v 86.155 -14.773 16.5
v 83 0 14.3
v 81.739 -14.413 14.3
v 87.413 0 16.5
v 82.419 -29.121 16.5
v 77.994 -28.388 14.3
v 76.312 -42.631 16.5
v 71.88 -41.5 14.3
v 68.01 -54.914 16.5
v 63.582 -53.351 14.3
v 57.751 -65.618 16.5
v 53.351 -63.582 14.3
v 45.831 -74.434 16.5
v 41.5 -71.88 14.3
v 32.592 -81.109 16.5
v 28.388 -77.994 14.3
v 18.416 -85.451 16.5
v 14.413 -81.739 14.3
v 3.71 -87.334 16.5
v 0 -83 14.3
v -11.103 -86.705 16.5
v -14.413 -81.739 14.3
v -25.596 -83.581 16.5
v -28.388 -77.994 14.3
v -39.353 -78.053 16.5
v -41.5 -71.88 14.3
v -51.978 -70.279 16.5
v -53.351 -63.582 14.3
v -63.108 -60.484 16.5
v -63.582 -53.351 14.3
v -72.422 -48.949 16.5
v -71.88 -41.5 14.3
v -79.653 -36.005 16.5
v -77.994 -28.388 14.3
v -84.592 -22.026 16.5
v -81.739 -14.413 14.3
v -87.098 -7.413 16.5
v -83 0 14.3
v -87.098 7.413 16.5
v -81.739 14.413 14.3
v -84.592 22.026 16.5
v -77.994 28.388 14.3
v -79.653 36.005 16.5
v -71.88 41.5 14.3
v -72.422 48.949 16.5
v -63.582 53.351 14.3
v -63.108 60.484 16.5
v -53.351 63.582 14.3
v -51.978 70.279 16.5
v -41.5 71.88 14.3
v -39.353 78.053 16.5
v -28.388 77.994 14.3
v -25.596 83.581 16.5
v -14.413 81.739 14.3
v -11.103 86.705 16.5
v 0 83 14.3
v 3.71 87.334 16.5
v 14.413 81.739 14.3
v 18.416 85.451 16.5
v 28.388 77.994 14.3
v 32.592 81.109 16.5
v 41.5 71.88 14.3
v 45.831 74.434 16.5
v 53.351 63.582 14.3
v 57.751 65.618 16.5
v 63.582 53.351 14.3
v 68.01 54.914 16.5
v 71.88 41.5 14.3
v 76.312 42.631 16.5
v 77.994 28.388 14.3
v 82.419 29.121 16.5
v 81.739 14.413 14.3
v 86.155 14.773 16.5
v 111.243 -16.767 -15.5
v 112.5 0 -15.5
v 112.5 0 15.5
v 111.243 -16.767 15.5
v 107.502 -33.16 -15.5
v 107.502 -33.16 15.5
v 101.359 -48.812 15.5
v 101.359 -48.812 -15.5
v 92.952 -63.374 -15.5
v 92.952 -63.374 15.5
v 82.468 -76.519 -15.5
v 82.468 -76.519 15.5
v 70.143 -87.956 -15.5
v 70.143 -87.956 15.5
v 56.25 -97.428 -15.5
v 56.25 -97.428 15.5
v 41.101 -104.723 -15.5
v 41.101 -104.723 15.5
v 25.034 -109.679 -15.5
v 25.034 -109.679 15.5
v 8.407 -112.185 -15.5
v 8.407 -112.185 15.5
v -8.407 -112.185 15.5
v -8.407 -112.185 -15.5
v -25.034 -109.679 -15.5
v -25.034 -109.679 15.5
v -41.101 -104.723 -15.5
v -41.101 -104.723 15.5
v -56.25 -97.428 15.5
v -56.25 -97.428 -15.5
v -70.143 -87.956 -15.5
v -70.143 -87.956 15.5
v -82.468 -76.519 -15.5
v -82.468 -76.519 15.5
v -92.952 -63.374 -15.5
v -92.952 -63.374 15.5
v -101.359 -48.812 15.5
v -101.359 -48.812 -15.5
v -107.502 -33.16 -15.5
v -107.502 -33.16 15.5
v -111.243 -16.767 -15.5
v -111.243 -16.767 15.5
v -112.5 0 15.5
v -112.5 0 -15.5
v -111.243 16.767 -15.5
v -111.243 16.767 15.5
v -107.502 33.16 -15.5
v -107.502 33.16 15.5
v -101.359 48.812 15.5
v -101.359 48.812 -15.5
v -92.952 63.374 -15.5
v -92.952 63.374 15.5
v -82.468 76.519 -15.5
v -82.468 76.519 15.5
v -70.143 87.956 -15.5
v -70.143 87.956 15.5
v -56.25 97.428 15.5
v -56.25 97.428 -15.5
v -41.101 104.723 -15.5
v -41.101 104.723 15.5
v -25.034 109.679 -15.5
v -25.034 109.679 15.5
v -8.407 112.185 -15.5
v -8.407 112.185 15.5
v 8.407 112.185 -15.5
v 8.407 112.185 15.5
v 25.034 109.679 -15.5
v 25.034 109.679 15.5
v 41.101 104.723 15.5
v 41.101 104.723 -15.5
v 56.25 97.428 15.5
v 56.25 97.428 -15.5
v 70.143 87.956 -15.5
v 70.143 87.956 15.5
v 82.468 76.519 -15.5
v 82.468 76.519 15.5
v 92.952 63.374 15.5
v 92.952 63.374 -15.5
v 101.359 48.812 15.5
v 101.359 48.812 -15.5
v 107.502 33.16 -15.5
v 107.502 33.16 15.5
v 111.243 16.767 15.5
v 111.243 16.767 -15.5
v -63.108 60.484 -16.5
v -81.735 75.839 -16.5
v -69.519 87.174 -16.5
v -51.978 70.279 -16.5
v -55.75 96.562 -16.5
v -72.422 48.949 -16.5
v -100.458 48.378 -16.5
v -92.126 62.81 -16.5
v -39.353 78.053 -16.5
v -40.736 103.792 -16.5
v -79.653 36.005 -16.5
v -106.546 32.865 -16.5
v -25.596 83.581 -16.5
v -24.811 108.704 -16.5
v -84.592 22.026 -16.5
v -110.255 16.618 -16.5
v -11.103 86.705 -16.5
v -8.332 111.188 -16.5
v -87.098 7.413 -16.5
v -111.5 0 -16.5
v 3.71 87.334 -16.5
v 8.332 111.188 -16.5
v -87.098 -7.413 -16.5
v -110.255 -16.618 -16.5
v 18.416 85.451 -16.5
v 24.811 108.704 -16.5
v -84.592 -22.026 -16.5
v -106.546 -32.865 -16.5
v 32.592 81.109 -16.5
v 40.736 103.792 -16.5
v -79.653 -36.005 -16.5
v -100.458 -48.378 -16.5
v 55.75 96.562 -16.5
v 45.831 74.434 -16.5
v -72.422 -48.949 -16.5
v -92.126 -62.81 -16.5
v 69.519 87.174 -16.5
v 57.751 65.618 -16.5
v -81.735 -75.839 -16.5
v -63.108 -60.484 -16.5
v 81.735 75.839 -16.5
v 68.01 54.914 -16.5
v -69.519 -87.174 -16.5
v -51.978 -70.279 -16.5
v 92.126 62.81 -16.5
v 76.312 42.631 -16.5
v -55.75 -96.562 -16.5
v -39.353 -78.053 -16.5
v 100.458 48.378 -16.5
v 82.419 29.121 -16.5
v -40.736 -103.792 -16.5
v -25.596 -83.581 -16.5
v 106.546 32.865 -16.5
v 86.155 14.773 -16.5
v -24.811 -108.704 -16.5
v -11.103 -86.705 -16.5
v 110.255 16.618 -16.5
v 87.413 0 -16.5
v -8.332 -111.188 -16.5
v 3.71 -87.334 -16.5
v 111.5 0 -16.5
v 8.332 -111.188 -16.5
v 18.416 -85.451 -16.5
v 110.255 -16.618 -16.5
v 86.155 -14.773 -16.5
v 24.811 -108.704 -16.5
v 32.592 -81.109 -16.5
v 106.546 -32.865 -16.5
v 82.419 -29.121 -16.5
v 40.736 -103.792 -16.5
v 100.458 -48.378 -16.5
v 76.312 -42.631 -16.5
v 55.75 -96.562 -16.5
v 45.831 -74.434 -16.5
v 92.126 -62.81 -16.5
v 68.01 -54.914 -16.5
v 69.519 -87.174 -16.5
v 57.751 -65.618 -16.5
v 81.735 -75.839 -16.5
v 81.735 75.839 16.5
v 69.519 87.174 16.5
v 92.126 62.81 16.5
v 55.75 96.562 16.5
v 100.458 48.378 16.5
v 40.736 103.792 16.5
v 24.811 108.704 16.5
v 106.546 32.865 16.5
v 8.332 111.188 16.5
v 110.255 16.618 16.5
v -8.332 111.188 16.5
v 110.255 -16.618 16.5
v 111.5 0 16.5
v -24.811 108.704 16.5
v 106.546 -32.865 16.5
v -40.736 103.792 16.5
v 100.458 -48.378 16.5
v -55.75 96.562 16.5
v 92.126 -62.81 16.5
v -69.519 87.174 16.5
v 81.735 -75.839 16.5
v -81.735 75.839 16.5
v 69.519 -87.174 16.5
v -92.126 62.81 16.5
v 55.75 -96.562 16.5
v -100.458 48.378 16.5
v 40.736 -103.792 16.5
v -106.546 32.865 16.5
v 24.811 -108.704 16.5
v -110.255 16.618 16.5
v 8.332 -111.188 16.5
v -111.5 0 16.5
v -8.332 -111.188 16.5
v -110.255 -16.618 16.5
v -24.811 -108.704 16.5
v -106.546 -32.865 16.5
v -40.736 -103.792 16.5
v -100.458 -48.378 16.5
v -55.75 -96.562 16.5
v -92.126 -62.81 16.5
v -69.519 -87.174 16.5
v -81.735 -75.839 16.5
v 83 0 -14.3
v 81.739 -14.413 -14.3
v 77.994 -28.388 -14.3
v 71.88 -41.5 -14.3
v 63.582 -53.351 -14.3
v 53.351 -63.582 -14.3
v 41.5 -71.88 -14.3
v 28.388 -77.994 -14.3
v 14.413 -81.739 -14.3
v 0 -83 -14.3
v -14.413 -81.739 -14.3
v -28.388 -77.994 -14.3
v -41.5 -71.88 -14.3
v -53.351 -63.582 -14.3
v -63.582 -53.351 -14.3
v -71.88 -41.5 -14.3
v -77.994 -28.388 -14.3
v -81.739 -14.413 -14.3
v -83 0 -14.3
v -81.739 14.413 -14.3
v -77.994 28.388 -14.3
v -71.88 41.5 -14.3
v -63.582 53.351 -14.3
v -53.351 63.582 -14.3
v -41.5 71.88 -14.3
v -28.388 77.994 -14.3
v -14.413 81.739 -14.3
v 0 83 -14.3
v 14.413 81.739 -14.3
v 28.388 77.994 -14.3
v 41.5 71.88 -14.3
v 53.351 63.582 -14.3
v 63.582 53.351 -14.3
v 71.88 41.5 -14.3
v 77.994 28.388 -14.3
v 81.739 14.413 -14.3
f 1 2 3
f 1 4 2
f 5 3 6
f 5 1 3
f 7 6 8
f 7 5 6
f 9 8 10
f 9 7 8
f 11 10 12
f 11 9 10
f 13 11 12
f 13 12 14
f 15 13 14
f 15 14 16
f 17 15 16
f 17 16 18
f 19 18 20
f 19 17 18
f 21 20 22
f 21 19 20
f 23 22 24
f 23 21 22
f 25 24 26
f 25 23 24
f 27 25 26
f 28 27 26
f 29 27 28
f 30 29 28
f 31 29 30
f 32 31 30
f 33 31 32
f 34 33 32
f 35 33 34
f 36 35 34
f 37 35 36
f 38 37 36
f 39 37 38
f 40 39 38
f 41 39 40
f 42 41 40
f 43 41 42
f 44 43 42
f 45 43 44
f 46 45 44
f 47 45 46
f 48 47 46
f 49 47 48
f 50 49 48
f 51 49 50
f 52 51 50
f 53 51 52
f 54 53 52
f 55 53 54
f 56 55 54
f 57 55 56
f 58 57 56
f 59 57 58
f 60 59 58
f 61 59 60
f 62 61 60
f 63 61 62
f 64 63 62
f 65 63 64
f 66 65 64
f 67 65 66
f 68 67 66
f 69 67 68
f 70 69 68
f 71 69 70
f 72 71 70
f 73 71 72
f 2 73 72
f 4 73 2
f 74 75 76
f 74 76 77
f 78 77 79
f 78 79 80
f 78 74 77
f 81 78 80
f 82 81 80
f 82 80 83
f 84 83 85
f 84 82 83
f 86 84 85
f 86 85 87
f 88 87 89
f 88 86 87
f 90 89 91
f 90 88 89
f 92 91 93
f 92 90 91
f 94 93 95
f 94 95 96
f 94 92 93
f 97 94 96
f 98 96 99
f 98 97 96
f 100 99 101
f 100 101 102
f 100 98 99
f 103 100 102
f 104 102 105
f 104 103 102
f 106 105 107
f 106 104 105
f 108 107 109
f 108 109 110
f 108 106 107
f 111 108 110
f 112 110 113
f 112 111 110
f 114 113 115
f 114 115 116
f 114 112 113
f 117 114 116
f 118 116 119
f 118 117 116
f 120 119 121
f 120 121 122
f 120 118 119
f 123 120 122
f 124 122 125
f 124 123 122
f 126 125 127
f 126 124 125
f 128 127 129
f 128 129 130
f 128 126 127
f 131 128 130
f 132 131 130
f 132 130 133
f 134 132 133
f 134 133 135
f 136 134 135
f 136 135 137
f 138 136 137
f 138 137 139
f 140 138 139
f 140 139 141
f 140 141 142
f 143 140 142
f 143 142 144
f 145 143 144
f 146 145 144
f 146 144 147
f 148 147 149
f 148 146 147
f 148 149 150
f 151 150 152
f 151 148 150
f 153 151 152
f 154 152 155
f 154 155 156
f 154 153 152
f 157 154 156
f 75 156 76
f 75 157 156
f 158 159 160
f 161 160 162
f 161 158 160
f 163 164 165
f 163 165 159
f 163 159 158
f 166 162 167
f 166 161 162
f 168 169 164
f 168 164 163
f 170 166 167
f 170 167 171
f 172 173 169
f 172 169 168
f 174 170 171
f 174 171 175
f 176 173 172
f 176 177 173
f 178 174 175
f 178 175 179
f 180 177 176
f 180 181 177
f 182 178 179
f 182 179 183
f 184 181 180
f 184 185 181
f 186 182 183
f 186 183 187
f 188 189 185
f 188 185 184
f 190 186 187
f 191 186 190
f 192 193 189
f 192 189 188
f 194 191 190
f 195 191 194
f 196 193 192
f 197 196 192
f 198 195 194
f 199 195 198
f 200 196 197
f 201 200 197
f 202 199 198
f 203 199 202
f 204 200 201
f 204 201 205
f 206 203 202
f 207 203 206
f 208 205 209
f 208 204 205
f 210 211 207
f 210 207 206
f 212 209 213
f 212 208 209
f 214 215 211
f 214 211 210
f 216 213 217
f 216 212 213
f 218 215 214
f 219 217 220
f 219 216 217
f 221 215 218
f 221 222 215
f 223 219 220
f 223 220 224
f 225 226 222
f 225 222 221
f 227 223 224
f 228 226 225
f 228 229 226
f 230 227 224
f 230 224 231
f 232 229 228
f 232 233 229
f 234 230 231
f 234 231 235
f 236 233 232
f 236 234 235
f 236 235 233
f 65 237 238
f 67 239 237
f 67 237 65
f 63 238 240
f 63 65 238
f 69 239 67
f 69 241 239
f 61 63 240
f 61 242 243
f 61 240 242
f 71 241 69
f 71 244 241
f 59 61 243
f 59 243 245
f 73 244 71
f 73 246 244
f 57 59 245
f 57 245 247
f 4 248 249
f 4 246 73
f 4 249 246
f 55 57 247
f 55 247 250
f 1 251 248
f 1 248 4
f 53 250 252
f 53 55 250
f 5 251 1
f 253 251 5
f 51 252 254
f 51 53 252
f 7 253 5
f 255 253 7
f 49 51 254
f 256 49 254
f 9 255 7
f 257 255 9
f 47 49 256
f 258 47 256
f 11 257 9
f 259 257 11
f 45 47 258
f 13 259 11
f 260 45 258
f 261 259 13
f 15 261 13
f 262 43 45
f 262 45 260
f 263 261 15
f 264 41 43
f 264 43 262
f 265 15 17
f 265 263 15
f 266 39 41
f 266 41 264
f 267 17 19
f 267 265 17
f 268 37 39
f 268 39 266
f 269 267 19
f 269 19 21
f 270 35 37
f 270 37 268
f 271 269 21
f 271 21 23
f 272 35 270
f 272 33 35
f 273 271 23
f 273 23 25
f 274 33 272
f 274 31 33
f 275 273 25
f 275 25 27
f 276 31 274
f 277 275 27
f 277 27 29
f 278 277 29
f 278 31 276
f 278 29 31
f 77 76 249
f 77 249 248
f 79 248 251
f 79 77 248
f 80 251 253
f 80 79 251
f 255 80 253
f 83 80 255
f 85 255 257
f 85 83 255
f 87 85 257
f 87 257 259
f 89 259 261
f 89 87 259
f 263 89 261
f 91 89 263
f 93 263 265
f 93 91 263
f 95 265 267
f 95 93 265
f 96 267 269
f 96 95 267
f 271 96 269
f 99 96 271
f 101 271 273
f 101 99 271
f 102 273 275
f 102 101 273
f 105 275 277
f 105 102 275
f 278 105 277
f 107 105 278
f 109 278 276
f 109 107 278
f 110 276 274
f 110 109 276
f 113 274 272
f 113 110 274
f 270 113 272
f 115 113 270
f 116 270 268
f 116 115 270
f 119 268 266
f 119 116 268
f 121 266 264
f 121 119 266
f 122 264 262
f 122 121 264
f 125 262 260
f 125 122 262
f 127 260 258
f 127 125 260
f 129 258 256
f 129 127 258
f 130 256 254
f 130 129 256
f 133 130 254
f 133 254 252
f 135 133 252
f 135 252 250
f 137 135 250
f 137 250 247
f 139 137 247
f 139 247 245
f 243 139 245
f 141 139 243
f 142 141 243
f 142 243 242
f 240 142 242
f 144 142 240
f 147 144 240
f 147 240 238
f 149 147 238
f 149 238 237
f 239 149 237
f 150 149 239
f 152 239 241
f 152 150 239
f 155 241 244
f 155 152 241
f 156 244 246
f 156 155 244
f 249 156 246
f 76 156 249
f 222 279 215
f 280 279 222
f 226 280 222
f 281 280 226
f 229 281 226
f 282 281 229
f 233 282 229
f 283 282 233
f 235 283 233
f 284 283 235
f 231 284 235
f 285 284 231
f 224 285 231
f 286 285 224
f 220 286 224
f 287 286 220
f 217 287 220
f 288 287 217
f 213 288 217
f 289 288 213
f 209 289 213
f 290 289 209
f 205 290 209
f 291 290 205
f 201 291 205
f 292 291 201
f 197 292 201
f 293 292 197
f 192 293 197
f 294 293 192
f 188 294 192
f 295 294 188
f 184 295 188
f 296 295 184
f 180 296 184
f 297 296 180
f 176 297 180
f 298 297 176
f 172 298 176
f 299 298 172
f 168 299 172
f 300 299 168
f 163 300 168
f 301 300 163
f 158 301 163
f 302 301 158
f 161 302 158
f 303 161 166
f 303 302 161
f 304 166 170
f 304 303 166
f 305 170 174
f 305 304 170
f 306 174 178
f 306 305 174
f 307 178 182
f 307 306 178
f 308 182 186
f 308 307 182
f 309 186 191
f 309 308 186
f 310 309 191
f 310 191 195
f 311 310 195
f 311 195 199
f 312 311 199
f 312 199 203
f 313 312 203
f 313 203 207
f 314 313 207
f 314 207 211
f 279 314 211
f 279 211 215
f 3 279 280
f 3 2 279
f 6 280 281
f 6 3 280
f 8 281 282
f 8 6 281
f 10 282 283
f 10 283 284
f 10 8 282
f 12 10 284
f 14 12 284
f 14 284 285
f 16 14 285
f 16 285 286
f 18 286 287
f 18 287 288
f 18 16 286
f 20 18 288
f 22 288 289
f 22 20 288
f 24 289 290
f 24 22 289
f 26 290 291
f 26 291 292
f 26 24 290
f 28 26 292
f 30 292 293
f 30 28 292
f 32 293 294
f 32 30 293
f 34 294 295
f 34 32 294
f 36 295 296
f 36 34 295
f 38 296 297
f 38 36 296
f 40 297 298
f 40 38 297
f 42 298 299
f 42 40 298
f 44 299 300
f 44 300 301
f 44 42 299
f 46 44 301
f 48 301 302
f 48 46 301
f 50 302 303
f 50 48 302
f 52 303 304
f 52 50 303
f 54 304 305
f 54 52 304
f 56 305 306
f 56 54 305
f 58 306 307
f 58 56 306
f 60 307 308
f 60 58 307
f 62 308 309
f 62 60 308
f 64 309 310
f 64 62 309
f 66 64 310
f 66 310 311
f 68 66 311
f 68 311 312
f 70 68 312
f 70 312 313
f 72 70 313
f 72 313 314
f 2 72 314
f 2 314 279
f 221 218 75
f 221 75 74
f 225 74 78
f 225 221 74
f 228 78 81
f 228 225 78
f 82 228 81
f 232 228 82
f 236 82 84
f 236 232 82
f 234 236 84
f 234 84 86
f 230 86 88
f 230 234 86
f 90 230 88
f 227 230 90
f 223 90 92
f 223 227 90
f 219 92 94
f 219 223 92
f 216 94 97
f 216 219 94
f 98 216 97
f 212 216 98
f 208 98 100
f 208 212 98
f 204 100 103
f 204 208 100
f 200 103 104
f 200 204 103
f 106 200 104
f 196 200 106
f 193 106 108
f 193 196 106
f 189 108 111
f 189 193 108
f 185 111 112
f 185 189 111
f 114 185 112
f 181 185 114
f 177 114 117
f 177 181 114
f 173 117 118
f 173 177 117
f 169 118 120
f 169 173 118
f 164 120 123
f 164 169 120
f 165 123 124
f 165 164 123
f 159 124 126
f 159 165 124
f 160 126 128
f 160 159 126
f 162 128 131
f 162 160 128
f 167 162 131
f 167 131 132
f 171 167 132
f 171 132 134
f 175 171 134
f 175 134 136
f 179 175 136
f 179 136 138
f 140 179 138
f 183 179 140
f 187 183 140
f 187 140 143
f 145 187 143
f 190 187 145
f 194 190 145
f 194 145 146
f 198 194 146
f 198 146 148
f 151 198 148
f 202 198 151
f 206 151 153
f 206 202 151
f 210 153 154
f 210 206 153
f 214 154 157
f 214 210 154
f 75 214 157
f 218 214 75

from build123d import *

# Parameters (mm, degrees)
CHAMFER_1_SIZE = 1


with BuildPart() as part:
    # 草图1 → 旋转1 (revolve)
    with BuildSketch(Plane(origin=(0, 0, 0), x_dir=(0, 0, -1), z_dir=(1, 0, 0)), mode=Mode.PRIVATE) as revolve_1_sk:
        Polygon((14.3, 83), (-14.3, 83), (-16.5, 87.412517358), (-16.5, 112.5), (16.5, 112.5), (16.5, 87.412517358), align=None)
    revolve(revolve_1_sk.sketch.rotate(Axis((0, 0, 15.038452749), (0, 0, -1)), 90), axis=Axis((0, 0, 15.038452749), (0, 0, -1)))

    # 倒角1
    chamfer_1_edges = [part.edges().sort_by_distance(p)[0] for p in [
        (-112.5, 0, -16.5),
        (-112.5, 0, 16.5),
    ]]
    chamfer(chamfer_1_edges, length=CHAMFER_1_SIZE)


solid = part.part
